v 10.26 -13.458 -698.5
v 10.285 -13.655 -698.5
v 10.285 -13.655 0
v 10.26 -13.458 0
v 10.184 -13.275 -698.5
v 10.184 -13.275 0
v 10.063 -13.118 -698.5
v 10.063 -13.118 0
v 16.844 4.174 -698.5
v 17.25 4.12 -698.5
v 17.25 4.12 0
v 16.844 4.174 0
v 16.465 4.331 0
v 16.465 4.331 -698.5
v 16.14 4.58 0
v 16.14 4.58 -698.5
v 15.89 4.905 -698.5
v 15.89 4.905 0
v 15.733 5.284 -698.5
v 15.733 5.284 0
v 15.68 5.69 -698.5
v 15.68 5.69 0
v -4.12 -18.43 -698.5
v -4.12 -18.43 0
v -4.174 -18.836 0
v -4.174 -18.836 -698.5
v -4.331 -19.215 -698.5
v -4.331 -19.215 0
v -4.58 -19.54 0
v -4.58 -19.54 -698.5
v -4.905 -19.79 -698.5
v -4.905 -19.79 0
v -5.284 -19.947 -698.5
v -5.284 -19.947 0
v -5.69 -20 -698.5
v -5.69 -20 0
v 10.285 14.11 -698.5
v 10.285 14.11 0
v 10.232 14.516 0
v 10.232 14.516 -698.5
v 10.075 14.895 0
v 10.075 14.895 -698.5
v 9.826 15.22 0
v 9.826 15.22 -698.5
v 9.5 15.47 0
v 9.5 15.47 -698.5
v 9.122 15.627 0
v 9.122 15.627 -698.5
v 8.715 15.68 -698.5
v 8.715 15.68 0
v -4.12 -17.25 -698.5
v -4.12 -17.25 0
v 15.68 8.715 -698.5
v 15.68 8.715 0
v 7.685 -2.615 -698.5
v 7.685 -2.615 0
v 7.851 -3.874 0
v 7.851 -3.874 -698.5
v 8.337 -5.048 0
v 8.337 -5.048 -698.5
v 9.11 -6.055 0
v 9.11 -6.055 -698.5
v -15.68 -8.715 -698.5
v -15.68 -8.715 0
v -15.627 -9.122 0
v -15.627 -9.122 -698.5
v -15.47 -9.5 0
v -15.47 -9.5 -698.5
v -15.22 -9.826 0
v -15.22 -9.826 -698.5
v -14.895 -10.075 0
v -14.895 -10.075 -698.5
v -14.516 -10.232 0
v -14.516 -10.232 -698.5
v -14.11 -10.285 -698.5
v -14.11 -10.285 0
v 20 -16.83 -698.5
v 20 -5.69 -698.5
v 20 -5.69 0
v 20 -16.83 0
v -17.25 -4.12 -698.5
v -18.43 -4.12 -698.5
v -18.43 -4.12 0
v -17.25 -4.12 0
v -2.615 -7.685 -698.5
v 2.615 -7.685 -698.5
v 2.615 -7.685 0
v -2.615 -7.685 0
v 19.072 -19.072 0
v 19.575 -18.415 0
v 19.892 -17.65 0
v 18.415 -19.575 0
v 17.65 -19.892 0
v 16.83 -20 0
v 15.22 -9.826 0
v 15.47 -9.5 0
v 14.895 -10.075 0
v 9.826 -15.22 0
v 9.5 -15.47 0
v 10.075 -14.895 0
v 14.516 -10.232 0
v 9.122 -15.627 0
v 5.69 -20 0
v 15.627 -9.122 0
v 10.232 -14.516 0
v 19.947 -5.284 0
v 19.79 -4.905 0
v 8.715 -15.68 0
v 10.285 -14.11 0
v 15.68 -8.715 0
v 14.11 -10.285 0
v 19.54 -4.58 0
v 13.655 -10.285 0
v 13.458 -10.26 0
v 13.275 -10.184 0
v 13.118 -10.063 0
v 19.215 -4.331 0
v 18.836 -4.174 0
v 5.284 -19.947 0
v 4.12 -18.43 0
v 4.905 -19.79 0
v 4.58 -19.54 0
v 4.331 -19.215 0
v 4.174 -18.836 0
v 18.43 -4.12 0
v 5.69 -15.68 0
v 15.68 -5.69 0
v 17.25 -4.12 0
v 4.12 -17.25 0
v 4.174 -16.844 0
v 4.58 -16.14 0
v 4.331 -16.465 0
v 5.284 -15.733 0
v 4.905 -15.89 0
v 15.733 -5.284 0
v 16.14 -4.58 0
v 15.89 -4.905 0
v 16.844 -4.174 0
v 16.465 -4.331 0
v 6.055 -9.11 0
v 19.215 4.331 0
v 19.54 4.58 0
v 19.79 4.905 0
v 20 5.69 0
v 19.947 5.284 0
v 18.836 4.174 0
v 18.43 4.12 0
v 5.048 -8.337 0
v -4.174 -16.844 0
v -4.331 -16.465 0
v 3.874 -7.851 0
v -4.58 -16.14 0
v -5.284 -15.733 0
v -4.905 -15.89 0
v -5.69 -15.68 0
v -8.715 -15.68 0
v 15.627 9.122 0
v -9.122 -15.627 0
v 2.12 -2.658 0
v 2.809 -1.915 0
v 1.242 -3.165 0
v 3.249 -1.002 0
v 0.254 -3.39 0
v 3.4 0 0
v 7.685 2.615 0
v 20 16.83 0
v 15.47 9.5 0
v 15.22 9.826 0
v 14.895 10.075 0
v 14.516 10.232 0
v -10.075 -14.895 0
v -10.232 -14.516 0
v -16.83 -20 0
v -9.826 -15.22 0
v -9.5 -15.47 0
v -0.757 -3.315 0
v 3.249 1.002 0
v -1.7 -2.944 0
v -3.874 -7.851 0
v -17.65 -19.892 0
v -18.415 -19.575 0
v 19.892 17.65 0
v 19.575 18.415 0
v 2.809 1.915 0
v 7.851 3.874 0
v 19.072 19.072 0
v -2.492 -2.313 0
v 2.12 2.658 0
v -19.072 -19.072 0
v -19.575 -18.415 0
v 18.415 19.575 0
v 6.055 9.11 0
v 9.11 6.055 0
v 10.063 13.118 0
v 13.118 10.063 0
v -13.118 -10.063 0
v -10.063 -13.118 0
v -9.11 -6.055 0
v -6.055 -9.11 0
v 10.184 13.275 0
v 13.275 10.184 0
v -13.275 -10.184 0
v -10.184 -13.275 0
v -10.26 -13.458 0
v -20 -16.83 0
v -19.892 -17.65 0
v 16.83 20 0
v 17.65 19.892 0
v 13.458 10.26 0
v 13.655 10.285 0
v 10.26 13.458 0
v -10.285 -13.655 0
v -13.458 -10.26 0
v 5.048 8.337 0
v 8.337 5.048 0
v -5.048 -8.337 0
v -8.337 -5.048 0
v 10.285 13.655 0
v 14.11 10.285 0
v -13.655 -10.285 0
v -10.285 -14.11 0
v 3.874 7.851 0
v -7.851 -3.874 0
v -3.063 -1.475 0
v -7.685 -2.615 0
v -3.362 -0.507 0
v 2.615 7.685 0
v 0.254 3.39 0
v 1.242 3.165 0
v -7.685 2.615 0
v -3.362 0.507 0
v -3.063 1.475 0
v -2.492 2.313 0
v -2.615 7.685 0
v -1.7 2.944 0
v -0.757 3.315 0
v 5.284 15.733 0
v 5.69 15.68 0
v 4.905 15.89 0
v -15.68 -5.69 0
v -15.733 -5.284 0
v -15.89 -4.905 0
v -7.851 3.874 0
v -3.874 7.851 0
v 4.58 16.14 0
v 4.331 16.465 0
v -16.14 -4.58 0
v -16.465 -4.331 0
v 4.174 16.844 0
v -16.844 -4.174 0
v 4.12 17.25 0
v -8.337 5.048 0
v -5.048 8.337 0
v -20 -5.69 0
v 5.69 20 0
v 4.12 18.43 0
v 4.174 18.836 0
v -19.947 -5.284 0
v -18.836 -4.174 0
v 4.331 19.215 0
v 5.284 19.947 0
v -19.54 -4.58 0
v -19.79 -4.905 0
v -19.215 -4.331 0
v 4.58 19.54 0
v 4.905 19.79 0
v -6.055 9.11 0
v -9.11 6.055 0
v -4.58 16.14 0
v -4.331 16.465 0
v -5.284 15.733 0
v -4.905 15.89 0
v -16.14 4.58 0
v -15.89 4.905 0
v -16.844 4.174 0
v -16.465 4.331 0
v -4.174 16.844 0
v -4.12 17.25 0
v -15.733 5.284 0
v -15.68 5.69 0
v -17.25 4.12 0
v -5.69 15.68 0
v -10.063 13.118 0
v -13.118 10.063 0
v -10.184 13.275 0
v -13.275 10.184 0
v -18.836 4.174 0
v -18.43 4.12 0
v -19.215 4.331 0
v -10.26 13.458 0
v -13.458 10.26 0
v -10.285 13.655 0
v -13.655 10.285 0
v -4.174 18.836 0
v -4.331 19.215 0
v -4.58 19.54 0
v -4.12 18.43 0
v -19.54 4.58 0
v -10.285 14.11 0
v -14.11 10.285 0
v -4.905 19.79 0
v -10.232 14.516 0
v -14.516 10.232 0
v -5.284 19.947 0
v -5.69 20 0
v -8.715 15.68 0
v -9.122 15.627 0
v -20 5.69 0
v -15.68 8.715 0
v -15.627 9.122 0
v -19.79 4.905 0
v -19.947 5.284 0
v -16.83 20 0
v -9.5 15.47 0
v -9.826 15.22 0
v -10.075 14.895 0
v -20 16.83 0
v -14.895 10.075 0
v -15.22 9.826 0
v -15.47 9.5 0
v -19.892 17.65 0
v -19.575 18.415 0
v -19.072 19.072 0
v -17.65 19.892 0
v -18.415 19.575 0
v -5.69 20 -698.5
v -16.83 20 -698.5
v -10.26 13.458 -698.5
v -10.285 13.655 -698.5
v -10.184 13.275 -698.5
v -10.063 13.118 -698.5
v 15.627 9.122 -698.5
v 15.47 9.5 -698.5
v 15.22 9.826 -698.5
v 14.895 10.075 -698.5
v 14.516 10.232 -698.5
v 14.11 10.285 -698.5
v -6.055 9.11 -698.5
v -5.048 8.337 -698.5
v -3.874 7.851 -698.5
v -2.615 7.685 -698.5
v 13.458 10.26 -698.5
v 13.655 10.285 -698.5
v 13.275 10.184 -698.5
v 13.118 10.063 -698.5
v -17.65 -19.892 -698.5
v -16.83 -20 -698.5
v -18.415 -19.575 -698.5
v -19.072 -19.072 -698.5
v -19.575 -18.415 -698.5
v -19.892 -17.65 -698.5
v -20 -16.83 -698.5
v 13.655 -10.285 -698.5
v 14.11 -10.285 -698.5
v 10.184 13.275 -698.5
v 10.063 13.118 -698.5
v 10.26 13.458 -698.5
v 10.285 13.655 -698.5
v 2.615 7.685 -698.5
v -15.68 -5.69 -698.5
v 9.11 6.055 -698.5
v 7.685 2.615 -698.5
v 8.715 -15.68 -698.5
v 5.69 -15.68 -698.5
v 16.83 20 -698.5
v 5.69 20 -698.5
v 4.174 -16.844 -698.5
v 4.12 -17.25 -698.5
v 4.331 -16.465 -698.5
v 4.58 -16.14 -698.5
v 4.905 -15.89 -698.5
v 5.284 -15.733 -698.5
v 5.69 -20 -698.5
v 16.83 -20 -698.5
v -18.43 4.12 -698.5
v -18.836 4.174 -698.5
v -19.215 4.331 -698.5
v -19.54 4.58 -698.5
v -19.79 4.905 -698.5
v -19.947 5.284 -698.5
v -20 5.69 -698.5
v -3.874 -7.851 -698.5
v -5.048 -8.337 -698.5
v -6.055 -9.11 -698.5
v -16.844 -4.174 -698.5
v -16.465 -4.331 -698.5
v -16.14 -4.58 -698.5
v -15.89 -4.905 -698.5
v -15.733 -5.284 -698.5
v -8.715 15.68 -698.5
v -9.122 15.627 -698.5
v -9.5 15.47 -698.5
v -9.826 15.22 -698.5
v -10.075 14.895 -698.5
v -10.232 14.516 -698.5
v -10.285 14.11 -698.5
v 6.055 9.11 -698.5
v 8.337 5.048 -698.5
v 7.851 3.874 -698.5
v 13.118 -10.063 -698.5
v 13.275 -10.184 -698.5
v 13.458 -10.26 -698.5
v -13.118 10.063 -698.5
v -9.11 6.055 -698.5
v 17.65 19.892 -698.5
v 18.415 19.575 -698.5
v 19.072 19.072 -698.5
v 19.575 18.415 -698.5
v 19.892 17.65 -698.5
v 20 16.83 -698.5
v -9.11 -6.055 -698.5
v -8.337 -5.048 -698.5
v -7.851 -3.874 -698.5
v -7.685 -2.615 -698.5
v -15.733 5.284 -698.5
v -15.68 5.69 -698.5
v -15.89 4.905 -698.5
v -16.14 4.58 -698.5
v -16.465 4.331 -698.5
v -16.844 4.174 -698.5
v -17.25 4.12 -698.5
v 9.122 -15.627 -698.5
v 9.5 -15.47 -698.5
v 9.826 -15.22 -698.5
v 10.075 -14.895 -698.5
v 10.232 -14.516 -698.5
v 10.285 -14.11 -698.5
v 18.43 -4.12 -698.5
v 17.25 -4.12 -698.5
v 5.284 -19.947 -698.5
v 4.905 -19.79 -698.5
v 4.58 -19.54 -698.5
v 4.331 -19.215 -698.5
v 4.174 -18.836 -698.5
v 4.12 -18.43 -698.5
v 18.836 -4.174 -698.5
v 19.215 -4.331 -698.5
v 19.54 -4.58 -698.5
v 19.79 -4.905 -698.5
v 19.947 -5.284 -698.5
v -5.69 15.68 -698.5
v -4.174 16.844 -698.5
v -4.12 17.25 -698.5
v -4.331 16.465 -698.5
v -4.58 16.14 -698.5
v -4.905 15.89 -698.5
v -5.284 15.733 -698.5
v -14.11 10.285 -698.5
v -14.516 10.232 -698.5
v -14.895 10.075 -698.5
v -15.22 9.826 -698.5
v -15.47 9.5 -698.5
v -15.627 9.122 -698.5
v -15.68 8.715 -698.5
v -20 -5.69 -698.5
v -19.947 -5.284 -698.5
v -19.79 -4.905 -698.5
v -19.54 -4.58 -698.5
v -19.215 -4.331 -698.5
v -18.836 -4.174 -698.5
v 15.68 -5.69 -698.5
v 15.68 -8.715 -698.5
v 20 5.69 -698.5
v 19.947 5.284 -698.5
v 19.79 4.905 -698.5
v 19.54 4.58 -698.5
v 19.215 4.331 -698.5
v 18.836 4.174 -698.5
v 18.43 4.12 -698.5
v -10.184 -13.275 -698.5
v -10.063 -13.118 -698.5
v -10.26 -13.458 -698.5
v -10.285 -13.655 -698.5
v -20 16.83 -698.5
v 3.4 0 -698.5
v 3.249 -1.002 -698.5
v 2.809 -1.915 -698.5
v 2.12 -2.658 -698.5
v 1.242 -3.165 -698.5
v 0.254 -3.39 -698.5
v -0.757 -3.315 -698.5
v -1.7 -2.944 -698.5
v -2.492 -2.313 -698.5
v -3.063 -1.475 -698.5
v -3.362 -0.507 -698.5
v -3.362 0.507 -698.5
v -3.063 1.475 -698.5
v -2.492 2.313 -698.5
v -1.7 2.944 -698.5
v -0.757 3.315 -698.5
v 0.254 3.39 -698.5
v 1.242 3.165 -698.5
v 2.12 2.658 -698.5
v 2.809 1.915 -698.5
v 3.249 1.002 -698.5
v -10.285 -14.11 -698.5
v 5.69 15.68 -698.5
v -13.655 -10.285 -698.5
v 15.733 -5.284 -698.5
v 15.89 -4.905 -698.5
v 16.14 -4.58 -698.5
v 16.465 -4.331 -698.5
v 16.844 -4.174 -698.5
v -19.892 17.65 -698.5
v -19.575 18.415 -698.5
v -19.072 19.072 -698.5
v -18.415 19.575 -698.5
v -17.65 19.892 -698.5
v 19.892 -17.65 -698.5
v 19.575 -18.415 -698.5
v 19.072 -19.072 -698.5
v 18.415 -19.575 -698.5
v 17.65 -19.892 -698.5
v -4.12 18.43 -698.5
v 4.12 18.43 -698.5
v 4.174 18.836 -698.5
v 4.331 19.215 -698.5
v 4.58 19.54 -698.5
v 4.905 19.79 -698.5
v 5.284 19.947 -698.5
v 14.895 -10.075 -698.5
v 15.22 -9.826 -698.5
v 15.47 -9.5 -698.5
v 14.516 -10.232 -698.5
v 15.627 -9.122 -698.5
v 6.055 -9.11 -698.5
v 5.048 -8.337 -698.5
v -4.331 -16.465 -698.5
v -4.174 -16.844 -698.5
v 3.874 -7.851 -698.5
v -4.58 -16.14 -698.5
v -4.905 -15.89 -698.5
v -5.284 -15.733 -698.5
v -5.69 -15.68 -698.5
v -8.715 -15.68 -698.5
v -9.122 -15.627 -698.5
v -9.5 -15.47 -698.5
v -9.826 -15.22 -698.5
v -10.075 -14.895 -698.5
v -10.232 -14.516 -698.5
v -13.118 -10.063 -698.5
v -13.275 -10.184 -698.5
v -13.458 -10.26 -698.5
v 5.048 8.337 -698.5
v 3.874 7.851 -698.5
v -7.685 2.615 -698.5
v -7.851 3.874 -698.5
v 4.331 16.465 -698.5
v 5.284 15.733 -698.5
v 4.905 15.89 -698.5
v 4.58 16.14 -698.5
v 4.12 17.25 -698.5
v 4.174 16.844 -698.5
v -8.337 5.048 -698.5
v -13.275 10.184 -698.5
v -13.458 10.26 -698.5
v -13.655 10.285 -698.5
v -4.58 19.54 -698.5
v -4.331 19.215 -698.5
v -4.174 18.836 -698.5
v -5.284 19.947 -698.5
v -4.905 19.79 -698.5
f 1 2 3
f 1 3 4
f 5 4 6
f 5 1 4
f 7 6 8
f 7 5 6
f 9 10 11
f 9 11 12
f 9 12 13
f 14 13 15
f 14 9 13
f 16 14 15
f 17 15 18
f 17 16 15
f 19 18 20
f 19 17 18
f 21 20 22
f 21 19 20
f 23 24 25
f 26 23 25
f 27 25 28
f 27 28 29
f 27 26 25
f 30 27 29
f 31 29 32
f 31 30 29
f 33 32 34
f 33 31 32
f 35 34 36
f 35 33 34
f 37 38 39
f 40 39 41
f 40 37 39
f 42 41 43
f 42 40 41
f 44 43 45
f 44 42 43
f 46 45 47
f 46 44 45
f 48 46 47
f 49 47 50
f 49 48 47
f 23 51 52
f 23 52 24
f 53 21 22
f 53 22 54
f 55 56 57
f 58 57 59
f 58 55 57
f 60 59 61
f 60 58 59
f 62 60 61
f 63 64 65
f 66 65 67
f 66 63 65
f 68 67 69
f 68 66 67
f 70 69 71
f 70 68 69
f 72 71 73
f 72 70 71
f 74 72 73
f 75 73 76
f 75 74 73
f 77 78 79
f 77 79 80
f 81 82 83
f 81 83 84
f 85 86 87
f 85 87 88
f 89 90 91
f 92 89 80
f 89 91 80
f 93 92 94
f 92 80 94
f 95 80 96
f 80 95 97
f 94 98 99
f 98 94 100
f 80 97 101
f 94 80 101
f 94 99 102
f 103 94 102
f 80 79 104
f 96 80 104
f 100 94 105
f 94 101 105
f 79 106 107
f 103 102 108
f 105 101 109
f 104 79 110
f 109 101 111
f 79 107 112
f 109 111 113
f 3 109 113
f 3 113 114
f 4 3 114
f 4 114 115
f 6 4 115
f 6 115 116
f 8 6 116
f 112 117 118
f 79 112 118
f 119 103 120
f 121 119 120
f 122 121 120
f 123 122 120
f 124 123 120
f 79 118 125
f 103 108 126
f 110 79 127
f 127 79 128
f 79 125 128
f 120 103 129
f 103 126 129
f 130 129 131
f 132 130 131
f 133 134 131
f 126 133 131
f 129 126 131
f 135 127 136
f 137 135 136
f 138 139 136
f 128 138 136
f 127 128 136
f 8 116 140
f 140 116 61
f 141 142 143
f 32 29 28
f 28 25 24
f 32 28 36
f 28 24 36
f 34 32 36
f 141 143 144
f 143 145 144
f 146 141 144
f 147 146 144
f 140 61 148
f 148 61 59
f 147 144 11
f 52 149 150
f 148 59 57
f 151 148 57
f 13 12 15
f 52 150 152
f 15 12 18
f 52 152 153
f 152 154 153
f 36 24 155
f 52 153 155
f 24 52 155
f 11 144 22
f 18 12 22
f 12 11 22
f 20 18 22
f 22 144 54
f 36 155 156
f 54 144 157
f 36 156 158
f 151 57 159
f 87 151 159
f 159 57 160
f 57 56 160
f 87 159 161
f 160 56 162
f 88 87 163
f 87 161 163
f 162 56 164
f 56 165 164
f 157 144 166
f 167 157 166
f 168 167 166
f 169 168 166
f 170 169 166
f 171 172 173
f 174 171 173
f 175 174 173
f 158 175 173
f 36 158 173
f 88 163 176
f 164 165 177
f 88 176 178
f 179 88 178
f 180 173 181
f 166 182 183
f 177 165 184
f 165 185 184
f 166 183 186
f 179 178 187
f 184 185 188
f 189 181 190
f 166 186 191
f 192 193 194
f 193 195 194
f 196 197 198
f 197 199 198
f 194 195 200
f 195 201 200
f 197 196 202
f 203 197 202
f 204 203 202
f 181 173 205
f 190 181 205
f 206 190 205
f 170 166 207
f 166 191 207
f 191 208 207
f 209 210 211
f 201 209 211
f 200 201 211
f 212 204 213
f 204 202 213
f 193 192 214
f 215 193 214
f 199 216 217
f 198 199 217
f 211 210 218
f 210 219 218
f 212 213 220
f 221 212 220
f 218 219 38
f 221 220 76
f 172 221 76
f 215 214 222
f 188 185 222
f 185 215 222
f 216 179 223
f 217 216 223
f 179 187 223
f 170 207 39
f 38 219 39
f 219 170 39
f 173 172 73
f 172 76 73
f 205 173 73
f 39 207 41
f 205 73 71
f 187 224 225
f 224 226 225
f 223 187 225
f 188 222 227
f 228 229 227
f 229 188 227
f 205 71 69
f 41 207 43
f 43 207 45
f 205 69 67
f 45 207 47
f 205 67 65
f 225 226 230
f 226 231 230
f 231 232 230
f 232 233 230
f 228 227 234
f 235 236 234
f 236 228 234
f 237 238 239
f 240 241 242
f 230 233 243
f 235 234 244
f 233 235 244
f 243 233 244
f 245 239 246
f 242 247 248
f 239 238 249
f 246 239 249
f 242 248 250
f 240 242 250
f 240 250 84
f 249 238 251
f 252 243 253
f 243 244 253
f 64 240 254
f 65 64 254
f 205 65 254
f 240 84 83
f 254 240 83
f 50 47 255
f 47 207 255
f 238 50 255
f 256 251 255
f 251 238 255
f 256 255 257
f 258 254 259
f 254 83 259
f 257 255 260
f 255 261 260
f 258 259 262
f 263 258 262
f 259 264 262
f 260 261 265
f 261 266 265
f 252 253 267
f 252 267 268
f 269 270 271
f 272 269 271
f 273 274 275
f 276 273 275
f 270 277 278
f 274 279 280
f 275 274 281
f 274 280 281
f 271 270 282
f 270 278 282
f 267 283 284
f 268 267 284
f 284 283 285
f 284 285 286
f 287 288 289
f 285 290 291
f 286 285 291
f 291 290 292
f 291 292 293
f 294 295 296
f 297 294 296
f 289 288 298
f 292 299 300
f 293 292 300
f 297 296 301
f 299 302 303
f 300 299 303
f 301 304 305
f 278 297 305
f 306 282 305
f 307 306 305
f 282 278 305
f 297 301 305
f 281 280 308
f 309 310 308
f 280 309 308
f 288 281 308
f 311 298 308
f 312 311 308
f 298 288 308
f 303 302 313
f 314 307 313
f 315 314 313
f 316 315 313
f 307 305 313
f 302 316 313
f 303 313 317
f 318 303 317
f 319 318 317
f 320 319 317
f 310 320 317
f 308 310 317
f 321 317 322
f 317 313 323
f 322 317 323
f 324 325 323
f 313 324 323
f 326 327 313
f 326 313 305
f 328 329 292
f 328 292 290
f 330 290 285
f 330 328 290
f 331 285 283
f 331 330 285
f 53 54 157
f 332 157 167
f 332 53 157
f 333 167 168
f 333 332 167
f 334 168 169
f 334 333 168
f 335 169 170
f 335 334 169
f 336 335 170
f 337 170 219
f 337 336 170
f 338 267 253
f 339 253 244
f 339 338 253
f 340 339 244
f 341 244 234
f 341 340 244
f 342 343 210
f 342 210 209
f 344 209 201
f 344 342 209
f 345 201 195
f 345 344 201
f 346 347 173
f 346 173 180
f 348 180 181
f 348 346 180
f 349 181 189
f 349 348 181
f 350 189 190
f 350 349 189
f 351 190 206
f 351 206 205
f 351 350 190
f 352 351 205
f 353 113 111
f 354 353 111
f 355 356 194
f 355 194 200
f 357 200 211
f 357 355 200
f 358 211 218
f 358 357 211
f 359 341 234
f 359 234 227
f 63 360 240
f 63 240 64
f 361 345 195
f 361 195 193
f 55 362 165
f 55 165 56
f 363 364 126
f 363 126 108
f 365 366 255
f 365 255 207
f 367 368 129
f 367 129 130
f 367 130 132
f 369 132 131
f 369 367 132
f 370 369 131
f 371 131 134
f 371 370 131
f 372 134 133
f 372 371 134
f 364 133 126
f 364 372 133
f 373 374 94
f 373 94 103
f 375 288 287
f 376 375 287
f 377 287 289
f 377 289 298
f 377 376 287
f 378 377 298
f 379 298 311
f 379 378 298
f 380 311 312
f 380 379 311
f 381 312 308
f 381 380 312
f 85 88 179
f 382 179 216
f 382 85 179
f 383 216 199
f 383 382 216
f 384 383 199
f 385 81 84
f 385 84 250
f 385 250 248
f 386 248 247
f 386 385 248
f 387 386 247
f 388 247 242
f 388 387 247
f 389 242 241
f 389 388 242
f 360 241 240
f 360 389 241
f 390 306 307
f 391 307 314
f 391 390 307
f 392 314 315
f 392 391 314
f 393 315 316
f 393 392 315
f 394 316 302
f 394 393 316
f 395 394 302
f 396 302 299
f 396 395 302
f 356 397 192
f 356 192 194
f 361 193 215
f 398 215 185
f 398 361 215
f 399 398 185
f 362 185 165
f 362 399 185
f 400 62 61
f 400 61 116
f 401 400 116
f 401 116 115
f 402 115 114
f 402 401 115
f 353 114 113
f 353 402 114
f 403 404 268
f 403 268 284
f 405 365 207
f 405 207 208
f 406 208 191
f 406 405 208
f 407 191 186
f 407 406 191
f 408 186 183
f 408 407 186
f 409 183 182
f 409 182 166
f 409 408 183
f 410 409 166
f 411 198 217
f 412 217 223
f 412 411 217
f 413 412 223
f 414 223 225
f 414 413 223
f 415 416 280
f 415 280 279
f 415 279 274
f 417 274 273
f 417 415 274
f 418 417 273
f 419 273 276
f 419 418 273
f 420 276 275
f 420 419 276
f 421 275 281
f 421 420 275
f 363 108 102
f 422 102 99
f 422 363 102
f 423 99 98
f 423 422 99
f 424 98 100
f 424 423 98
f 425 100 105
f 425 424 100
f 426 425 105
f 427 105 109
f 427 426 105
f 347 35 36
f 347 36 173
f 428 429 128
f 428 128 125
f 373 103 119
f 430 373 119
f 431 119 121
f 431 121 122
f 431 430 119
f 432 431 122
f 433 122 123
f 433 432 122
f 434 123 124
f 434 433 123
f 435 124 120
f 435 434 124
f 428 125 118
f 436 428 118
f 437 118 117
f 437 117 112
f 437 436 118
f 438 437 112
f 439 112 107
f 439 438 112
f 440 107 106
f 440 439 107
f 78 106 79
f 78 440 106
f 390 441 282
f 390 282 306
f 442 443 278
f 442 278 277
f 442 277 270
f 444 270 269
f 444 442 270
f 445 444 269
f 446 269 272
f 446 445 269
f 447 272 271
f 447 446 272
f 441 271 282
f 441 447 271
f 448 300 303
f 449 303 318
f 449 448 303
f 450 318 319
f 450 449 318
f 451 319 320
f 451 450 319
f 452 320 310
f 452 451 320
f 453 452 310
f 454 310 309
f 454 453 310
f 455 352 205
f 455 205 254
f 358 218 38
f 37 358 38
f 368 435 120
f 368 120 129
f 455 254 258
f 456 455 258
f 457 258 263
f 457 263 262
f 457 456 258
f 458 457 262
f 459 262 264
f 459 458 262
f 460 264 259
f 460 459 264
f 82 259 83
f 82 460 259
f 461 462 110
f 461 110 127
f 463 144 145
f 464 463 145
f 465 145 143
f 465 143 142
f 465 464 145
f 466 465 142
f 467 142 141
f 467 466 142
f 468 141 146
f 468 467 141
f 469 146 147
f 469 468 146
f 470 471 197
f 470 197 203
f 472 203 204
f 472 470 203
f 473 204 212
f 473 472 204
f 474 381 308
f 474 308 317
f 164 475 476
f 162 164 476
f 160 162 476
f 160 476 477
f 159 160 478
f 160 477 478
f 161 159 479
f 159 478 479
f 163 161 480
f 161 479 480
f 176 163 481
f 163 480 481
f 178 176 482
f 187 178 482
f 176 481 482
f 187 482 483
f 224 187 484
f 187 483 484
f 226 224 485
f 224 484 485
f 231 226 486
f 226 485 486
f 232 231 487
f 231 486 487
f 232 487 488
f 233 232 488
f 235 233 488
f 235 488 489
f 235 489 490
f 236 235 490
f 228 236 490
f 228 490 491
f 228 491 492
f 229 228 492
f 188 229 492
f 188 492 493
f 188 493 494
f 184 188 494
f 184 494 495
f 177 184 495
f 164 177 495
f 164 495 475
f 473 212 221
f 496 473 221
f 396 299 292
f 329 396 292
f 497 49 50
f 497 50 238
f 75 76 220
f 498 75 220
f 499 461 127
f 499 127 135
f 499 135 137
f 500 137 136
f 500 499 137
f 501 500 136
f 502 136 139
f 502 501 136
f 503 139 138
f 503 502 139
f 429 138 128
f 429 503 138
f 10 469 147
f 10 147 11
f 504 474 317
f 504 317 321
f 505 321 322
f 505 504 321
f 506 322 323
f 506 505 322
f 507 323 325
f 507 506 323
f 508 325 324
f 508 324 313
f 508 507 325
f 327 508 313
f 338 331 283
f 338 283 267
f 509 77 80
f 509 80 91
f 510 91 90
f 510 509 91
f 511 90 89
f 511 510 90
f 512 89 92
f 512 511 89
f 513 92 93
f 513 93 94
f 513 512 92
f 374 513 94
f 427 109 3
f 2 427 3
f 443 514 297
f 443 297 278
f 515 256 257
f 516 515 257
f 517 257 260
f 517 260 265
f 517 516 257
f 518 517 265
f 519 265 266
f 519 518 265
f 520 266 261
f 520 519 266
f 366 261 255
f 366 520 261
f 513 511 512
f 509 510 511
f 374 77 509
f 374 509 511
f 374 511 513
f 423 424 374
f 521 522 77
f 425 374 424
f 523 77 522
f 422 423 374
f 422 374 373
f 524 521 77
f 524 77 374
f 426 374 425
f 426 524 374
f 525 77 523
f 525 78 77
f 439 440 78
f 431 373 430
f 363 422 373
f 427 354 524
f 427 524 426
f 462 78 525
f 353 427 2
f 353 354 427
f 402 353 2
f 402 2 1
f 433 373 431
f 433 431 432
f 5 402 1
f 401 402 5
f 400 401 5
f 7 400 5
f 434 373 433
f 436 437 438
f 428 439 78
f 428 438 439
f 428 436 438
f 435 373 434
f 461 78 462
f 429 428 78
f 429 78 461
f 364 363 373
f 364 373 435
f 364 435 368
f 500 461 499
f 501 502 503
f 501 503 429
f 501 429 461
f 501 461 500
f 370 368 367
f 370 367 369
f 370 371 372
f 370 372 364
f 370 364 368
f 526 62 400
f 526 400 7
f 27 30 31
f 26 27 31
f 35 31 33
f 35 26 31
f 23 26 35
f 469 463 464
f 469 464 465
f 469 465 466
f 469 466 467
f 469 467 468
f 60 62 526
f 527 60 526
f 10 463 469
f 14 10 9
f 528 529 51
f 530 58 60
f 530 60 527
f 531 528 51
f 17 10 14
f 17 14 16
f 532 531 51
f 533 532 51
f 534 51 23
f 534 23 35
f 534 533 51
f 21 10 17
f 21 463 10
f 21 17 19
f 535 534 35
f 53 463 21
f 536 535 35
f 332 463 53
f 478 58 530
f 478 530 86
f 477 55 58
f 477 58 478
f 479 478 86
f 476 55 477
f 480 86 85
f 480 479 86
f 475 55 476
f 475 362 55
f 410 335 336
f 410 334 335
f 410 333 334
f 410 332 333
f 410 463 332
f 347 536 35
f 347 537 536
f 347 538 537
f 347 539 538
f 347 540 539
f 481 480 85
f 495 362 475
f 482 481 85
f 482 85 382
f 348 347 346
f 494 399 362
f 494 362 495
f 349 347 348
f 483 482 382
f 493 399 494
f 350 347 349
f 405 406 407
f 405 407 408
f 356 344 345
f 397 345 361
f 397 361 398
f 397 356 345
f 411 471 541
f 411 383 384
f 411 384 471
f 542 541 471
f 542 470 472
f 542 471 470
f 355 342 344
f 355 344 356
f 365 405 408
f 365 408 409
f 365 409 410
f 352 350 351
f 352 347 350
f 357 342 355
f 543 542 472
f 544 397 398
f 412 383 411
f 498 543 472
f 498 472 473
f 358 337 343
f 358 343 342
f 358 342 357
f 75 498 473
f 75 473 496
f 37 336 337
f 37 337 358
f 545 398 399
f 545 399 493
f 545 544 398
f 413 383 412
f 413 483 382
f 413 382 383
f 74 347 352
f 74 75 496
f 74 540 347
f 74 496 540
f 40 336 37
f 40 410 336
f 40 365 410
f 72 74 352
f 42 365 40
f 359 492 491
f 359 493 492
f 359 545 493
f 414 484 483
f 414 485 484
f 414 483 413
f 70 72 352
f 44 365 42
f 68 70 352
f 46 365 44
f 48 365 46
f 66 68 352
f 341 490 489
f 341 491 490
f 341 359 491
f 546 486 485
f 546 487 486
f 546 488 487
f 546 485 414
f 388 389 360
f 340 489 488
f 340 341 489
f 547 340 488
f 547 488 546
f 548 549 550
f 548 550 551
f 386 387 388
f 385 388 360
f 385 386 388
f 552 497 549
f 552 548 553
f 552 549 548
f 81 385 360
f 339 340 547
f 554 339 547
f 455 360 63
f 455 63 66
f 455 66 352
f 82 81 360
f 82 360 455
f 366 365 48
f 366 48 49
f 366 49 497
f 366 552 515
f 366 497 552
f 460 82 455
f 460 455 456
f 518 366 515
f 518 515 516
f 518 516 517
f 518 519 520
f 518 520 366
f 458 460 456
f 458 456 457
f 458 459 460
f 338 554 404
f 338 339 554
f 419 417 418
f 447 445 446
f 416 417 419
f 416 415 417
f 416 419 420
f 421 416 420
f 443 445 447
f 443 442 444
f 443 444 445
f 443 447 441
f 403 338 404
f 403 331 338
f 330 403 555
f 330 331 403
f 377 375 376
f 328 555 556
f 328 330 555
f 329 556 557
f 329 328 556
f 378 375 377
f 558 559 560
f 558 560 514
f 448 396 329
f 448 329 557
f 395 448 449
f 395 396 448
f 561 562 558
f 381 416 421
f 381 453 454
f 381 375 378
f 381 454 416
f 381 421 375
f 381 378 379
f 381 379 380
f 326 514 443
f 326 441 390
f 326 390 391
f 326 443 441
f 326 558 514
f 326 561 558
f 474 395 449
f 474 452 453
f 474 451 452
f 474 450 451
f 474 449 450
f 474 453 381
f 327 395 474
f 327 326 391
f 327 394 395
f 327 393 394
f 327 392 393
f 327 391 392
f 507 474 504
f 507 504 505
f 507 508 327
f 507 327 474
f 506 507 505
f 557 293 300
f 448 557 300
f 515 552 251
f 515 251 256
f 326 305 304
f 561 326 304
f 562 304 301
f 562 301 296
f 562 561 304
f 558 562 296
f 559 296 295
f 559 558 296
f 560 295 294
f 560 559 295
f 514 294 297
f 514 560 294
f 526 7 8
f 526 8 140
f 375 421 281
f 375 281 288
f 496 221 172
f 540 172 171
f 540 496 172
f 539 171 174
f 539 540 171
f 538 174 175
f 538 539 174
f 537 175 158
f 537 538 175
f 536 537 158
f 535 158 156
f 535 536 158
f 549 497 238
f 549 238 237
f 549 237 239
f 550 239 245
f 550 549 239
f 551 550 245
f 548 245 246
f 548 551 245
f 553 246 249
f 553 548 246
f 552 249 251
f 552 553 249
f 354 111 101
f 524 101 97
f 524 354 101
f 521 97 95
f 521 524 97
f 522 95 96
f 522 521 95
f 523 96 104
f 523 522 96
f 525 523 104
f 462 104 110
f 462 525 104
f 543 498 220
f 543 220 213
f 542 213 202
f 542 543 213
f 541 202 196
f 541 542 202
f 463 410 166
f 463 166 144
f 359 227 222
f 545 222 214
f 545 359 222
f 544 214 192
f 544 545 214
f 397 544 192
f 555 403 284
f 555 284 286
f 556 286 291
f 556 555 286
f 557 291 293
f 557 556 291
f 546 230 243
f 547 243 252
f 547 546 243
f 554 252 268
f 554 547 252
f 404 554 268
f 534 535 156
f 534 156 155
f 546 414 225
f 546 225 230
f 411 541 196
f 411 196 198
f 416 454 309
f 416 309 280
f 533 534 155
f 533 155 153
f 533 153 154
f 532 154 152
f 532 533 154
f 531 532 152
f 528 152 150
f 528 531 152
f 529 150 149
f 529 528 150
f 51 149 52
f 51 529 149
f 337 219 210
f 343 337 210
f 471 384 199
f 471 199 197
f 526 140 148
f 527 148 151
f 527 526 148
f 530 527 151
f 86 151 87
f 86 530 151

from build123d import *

# Parameters (mm, degrees)
SKETCH1_R           = 3.4
BOSS_EXTRUDE1_DEPTH = 4000
SKETCH5_W           = 697.408290135
SKETCH5_H           = 280.560400268
CUT_EXTRUDE4_DEPTH  = 3343.402


with BuildPart() as part:
    # Sketch1 → Boss-Extrude1 (new body)
    with BuildSketch(Plane(origin=(0, 0, -4000), x_dir=(-1, 0, 0), z_dir=(0, 0, -1))):
        with BuildLine():
            Line((16.83, 20), (5.69044933, 20))
            ThreePointArc((5.69044933, 20), (4.580291684, 19.540157646), (4.12044933, 18.43))
            Line((4.12044933, 18.43), (4.12044933, 17.25))
            ThreePointArc((4.12044933, 17.25), (4.580291684, 16.139842354), (5.69044933, 15.68))
            Line((5.69044933, 15.68), (8.7153995, 15.68))
            ThreePointArc((8.7153995, 15.68), (9.825557146, 15.220157646), (10.2853995, 14.11))
            Line((10.2853995, 14.11), (10.2853995, 13.654903102))
            ThreePointArc((10.2853995, 13.654903102), (10.227547945, 13.364063694), (10.062800654, 13.117501948))
            Line((10.062800654, 13.117501948), (6.055092794, 9.109794088))
            ThreePointArc((6.055092794, 9.109794088), (4.47691877, 8.055291919), (2.615335582, 7.685))
            Line((2.615335582, 7.685), (-2.615335582, 7.685))
            ThreePointArc((-2.615335582, 7.685), (-4.47691877, 8.055291919), (-6.055092794, 9.109794088))
            Line((-6.055092794, 9.109794088), (-10.062800654, 13.117501948))
            ThreePointArc((-10.062800654, 13.117501948), (-10.227547945, 13.364063694), (-10.2853995, 13.654903102))
            Line((-10.2853995, 13.654903102), (-10.2853995, 14.11))
            ThreePointArc((-10.2853995, 14.11), (-9.825557146, 15.220157646), (-8.7153995, 15.68))
            Line((-8.7153995, 15.68), (-5.69044933, 15.68))
            ThreePointArc((-5.69044933, 15.68), (-4.580291684, 16.139842354), (-4.12044933, 17.25))
            Line((-4.12044933, 17.25), (-4.12044933, 18.43))
            ThreePointArc((-4.12044933, 18.43), (-4.580291684, 19.540157646), (-5.69044933, 20))
            Line((-5.69044933, 20), (-16.83, 20))
            ThreePointArc((-16.83, 20), (-19.071528496, 19.071528496), (-20, 16.83))
            Line((-20, 16.83), (-20, 5.69044933))
            ThreePointArc((-20, 5.69044933), (-19.540157646, 4.580291684), (-18.43, 4.12044933))
            Line((-18.43, 4.12044933), (-17.25, 4.12044933))
            ThreePointArc((-17.25, 4.12044933), (-16.139842354, 4.580291684), (-15.68, 5.69044933))
            Line((-15.68, 5.69044933), (-15.68, 8.7153995))
            ThreePointArc((-15.68, 8.7153995), (-15.220157646, 9.825557146), (-14.11, 10.2853995))
            Line((-14.11, 10.2853995), (-13.654903102, 10.2853995))
            ThreePointArc((-13.654903102, 10.2853995), (-13.364063694, 10.227547945), (-13.117501948, 10.062800654))
            Line((-13.117501948, 10.062800654), (-9.109794088, 6.055092794))
            ThreePointArc((-9.109794088, 6.055092794), (-8.055291919, 4.47691877), (-7.685, 2.615335582))
            Line((-7.685, 2.615335582), (-7.685, -2.615335582))
            ThreePointArc((-7.685, -2.615335582), (-8.055291919, -4.47691877), (-9.109794088, -6.055092794))
            Line((-9.109794088, -6.055092794), (-13.117501948, -10.062800654))
            ThreePointArc((-13.117501948, -10.062800654), (-13.364063694, -10.227547945), (-13.654903102, -10.2853995))
            Line((-13.654903102, -10.2853995), (-14.11, -10.2853995))
            ThreePointArc((-14.11, -10.2853995), (-15.220157646, -9.825557146), (-15.68, -8.7153995))
            Line((-15.68, -8.7153995), (-15.68, -5.69044933))
            ThreePointArc((-15.68, -5.69044933), (-16.139842354, -4.580291684), (-17.25, -4.12044933))
            Line((-17.25, -4.12044933), (-18.43, -4.12044933))
            ThreePointArc((-18.43, -4.12044933), (-19.540157646, -4.580291684), (-20, -5.69044933))
            Line((-20, -5.69044933), (-20, -16.83))
            ThreePointArc((-20, -16.83), (-19.071528496, -19.071528496), (-16.83, -20))
            Line((-16.83, -20), (-5.69044933, -20))
            ThreePointArc((-5.69044933, -20), (-4.580291684, -19.540157646), (-4.12044933, -18.43))
            Line((-4.12044933, -18.43), (-4.12044933, -17.25))
            ThreePointArc((-4.12044933, -17.25), (-4.580291684, -16.139842354), (-5.69044933, -15.68))
            Line((-5.69044933, -15.68), (-8.7153995, -15.68))
            ThreePointArc((-8.7153995, -15.68), (-9.825557146, -15.220157646), (-10.2853995, -14.11))
            Line((-10.2853995, -14.11), (-10.2853995, -13.654903102))
            ThreePointArc((-10.2853995, -13.654903102), (-10.227547945, -13.364063694), (-10.062800654, -13.117501948))
            Line((-10.062800654, -13.117501948), (-6.055092794, -9.109794088))
            ThreePointArc((-6.055092794, -9.109794088), (-4.47691877, -8.055291919), (-2.615335582, -7.685))
            Line((-2.615335582, -7.685), (2.615335582, -7.685))
            ThreePointArc((2.615335582, -7.685), (4.47691877, -8.055291919), (6.055092794, -9.109794088))
            Line((6.055092794, -9.109794088), (10.062800654, -13.117501948))
            ThreePointArc((10.062800654, -13.117501948), (10.227547945, -13.364063694), (10.2853995, -13.654903102))
            Line((10.2853995, -13.654903102), (10.2853995, -14.11))
            ThreePointArc((10.2853995, -14.11), (9.825557146, -15.220157646), (8.7153995, -15.68))
            Line((8.7153995, -15.68), (5.69044933, -15.68))
            ThreePointArc((5.69044933, -15.68), (4.580291684, -16.139842354), (4.12044933, -17.25))
            Line((4.12044933, -17.25), (4.12044933, -18.43))
            ThreePointArc((4.12044933, -18.43), (4.580291684, -19.540157646), (5.69044933, -20))
            Line((5.69044933, -20), (16.83, -20))
            ThreePointArc((16.83, -20), (19.071528496, -19.071528496), (20, -16.83))
            Line((20, -16.83), (20, -5.69044933))
            ThreePointArc((20, -5.69044933), (19.540157646, -4.580291684), (18.43, -4.12044933))
            Line((18.43, -4.12044933), (17.25, -4.12044933))
            ThreePointArc((17.25, -4.12044933), (16.139842354, -4.580291684), (15.68, -5.69044933))
            Line((15.68, -5.69044933), (15.68, -8.7153995))
            ThreePointArc((15.68, -8.7153995), (15.220157646, -9.825557146), (14.11, -10.2853995))
            Line((14.11, -10.2853995), (13.654903102, -10.2853995))
            ThreePointArc((13.654903102, -10.2853995), (13.364063694, -10.227547945), (13.117501948, -10.062800654))
            Line((13.117501948, -10.062800654), (9.109794088, -6.055092794))
            ThreePointArc((9.109794088, -6.055092794), (8.055291919, -4.47691877), (7.685, -2.615335582))
            Line((7.685, -2.615335582), (7.685, 2.615335582))
            ThreePointArc((7.685, 2.615335582), (8.055291919, 4.47691877), (9.109794088, 6.055092794))
            Line((9.109794088, 6.055092794), (13.117501948, 10.062800654))
            ThreePointArc((13.117501948, 10.062800654), (13.364063694, 10.227547945), (13.654903102, 10.2853995))
            Line((13.654903102, 10.2853995), (14.11, 10.2853995))
            ThreePointArc((14.11, 10.2853995), (15.220157646, 9.825557146), (15.68, 8.7153995))
            Line((15.68, 8.7153995), (15.68, 5.69044933))
            ThreePointArc((15.68, 5.69044933), (16.139842354, 4.580291684), (17.25, 4.12044933))
            Line((17.25, 4.12044933), (18.43, 4.12044933))
            ThreePointArc((18.43, 4.12044933), (19.540157646, 4.580291684), (20, 5.69044933))
            Line((20, 5.69044933), (20, 16.83))
            ThreePointArc((20, 16.83), (19.071528496, 19.071528496), (16.83, 20))
        make_face()
        with Locations(Location((0, 0, 0), (0, 0, 180))):
            Circle(SKETCH1_R, mode=Mode.SUBTRACT)
    extrude(amount=-BOSS_EXTRUDE1_DEPTH)

    # Sketch5 → Cut-Extrude4 (cut)
    with BuildSketch(Plane(origin=(0, 0, -698.5), x_dir=(-1, 0, 0), z_dir=(0, 0, -1))):
        with Locations((74.343626988, -18.89908474)):
            Rectangle(SKETCH5_W, SKETCH5_H)
    extrude(amount=CUT_EXTRUDE4_DEPTH, mode=Mode.SUBTRACT)


solid = part.part
